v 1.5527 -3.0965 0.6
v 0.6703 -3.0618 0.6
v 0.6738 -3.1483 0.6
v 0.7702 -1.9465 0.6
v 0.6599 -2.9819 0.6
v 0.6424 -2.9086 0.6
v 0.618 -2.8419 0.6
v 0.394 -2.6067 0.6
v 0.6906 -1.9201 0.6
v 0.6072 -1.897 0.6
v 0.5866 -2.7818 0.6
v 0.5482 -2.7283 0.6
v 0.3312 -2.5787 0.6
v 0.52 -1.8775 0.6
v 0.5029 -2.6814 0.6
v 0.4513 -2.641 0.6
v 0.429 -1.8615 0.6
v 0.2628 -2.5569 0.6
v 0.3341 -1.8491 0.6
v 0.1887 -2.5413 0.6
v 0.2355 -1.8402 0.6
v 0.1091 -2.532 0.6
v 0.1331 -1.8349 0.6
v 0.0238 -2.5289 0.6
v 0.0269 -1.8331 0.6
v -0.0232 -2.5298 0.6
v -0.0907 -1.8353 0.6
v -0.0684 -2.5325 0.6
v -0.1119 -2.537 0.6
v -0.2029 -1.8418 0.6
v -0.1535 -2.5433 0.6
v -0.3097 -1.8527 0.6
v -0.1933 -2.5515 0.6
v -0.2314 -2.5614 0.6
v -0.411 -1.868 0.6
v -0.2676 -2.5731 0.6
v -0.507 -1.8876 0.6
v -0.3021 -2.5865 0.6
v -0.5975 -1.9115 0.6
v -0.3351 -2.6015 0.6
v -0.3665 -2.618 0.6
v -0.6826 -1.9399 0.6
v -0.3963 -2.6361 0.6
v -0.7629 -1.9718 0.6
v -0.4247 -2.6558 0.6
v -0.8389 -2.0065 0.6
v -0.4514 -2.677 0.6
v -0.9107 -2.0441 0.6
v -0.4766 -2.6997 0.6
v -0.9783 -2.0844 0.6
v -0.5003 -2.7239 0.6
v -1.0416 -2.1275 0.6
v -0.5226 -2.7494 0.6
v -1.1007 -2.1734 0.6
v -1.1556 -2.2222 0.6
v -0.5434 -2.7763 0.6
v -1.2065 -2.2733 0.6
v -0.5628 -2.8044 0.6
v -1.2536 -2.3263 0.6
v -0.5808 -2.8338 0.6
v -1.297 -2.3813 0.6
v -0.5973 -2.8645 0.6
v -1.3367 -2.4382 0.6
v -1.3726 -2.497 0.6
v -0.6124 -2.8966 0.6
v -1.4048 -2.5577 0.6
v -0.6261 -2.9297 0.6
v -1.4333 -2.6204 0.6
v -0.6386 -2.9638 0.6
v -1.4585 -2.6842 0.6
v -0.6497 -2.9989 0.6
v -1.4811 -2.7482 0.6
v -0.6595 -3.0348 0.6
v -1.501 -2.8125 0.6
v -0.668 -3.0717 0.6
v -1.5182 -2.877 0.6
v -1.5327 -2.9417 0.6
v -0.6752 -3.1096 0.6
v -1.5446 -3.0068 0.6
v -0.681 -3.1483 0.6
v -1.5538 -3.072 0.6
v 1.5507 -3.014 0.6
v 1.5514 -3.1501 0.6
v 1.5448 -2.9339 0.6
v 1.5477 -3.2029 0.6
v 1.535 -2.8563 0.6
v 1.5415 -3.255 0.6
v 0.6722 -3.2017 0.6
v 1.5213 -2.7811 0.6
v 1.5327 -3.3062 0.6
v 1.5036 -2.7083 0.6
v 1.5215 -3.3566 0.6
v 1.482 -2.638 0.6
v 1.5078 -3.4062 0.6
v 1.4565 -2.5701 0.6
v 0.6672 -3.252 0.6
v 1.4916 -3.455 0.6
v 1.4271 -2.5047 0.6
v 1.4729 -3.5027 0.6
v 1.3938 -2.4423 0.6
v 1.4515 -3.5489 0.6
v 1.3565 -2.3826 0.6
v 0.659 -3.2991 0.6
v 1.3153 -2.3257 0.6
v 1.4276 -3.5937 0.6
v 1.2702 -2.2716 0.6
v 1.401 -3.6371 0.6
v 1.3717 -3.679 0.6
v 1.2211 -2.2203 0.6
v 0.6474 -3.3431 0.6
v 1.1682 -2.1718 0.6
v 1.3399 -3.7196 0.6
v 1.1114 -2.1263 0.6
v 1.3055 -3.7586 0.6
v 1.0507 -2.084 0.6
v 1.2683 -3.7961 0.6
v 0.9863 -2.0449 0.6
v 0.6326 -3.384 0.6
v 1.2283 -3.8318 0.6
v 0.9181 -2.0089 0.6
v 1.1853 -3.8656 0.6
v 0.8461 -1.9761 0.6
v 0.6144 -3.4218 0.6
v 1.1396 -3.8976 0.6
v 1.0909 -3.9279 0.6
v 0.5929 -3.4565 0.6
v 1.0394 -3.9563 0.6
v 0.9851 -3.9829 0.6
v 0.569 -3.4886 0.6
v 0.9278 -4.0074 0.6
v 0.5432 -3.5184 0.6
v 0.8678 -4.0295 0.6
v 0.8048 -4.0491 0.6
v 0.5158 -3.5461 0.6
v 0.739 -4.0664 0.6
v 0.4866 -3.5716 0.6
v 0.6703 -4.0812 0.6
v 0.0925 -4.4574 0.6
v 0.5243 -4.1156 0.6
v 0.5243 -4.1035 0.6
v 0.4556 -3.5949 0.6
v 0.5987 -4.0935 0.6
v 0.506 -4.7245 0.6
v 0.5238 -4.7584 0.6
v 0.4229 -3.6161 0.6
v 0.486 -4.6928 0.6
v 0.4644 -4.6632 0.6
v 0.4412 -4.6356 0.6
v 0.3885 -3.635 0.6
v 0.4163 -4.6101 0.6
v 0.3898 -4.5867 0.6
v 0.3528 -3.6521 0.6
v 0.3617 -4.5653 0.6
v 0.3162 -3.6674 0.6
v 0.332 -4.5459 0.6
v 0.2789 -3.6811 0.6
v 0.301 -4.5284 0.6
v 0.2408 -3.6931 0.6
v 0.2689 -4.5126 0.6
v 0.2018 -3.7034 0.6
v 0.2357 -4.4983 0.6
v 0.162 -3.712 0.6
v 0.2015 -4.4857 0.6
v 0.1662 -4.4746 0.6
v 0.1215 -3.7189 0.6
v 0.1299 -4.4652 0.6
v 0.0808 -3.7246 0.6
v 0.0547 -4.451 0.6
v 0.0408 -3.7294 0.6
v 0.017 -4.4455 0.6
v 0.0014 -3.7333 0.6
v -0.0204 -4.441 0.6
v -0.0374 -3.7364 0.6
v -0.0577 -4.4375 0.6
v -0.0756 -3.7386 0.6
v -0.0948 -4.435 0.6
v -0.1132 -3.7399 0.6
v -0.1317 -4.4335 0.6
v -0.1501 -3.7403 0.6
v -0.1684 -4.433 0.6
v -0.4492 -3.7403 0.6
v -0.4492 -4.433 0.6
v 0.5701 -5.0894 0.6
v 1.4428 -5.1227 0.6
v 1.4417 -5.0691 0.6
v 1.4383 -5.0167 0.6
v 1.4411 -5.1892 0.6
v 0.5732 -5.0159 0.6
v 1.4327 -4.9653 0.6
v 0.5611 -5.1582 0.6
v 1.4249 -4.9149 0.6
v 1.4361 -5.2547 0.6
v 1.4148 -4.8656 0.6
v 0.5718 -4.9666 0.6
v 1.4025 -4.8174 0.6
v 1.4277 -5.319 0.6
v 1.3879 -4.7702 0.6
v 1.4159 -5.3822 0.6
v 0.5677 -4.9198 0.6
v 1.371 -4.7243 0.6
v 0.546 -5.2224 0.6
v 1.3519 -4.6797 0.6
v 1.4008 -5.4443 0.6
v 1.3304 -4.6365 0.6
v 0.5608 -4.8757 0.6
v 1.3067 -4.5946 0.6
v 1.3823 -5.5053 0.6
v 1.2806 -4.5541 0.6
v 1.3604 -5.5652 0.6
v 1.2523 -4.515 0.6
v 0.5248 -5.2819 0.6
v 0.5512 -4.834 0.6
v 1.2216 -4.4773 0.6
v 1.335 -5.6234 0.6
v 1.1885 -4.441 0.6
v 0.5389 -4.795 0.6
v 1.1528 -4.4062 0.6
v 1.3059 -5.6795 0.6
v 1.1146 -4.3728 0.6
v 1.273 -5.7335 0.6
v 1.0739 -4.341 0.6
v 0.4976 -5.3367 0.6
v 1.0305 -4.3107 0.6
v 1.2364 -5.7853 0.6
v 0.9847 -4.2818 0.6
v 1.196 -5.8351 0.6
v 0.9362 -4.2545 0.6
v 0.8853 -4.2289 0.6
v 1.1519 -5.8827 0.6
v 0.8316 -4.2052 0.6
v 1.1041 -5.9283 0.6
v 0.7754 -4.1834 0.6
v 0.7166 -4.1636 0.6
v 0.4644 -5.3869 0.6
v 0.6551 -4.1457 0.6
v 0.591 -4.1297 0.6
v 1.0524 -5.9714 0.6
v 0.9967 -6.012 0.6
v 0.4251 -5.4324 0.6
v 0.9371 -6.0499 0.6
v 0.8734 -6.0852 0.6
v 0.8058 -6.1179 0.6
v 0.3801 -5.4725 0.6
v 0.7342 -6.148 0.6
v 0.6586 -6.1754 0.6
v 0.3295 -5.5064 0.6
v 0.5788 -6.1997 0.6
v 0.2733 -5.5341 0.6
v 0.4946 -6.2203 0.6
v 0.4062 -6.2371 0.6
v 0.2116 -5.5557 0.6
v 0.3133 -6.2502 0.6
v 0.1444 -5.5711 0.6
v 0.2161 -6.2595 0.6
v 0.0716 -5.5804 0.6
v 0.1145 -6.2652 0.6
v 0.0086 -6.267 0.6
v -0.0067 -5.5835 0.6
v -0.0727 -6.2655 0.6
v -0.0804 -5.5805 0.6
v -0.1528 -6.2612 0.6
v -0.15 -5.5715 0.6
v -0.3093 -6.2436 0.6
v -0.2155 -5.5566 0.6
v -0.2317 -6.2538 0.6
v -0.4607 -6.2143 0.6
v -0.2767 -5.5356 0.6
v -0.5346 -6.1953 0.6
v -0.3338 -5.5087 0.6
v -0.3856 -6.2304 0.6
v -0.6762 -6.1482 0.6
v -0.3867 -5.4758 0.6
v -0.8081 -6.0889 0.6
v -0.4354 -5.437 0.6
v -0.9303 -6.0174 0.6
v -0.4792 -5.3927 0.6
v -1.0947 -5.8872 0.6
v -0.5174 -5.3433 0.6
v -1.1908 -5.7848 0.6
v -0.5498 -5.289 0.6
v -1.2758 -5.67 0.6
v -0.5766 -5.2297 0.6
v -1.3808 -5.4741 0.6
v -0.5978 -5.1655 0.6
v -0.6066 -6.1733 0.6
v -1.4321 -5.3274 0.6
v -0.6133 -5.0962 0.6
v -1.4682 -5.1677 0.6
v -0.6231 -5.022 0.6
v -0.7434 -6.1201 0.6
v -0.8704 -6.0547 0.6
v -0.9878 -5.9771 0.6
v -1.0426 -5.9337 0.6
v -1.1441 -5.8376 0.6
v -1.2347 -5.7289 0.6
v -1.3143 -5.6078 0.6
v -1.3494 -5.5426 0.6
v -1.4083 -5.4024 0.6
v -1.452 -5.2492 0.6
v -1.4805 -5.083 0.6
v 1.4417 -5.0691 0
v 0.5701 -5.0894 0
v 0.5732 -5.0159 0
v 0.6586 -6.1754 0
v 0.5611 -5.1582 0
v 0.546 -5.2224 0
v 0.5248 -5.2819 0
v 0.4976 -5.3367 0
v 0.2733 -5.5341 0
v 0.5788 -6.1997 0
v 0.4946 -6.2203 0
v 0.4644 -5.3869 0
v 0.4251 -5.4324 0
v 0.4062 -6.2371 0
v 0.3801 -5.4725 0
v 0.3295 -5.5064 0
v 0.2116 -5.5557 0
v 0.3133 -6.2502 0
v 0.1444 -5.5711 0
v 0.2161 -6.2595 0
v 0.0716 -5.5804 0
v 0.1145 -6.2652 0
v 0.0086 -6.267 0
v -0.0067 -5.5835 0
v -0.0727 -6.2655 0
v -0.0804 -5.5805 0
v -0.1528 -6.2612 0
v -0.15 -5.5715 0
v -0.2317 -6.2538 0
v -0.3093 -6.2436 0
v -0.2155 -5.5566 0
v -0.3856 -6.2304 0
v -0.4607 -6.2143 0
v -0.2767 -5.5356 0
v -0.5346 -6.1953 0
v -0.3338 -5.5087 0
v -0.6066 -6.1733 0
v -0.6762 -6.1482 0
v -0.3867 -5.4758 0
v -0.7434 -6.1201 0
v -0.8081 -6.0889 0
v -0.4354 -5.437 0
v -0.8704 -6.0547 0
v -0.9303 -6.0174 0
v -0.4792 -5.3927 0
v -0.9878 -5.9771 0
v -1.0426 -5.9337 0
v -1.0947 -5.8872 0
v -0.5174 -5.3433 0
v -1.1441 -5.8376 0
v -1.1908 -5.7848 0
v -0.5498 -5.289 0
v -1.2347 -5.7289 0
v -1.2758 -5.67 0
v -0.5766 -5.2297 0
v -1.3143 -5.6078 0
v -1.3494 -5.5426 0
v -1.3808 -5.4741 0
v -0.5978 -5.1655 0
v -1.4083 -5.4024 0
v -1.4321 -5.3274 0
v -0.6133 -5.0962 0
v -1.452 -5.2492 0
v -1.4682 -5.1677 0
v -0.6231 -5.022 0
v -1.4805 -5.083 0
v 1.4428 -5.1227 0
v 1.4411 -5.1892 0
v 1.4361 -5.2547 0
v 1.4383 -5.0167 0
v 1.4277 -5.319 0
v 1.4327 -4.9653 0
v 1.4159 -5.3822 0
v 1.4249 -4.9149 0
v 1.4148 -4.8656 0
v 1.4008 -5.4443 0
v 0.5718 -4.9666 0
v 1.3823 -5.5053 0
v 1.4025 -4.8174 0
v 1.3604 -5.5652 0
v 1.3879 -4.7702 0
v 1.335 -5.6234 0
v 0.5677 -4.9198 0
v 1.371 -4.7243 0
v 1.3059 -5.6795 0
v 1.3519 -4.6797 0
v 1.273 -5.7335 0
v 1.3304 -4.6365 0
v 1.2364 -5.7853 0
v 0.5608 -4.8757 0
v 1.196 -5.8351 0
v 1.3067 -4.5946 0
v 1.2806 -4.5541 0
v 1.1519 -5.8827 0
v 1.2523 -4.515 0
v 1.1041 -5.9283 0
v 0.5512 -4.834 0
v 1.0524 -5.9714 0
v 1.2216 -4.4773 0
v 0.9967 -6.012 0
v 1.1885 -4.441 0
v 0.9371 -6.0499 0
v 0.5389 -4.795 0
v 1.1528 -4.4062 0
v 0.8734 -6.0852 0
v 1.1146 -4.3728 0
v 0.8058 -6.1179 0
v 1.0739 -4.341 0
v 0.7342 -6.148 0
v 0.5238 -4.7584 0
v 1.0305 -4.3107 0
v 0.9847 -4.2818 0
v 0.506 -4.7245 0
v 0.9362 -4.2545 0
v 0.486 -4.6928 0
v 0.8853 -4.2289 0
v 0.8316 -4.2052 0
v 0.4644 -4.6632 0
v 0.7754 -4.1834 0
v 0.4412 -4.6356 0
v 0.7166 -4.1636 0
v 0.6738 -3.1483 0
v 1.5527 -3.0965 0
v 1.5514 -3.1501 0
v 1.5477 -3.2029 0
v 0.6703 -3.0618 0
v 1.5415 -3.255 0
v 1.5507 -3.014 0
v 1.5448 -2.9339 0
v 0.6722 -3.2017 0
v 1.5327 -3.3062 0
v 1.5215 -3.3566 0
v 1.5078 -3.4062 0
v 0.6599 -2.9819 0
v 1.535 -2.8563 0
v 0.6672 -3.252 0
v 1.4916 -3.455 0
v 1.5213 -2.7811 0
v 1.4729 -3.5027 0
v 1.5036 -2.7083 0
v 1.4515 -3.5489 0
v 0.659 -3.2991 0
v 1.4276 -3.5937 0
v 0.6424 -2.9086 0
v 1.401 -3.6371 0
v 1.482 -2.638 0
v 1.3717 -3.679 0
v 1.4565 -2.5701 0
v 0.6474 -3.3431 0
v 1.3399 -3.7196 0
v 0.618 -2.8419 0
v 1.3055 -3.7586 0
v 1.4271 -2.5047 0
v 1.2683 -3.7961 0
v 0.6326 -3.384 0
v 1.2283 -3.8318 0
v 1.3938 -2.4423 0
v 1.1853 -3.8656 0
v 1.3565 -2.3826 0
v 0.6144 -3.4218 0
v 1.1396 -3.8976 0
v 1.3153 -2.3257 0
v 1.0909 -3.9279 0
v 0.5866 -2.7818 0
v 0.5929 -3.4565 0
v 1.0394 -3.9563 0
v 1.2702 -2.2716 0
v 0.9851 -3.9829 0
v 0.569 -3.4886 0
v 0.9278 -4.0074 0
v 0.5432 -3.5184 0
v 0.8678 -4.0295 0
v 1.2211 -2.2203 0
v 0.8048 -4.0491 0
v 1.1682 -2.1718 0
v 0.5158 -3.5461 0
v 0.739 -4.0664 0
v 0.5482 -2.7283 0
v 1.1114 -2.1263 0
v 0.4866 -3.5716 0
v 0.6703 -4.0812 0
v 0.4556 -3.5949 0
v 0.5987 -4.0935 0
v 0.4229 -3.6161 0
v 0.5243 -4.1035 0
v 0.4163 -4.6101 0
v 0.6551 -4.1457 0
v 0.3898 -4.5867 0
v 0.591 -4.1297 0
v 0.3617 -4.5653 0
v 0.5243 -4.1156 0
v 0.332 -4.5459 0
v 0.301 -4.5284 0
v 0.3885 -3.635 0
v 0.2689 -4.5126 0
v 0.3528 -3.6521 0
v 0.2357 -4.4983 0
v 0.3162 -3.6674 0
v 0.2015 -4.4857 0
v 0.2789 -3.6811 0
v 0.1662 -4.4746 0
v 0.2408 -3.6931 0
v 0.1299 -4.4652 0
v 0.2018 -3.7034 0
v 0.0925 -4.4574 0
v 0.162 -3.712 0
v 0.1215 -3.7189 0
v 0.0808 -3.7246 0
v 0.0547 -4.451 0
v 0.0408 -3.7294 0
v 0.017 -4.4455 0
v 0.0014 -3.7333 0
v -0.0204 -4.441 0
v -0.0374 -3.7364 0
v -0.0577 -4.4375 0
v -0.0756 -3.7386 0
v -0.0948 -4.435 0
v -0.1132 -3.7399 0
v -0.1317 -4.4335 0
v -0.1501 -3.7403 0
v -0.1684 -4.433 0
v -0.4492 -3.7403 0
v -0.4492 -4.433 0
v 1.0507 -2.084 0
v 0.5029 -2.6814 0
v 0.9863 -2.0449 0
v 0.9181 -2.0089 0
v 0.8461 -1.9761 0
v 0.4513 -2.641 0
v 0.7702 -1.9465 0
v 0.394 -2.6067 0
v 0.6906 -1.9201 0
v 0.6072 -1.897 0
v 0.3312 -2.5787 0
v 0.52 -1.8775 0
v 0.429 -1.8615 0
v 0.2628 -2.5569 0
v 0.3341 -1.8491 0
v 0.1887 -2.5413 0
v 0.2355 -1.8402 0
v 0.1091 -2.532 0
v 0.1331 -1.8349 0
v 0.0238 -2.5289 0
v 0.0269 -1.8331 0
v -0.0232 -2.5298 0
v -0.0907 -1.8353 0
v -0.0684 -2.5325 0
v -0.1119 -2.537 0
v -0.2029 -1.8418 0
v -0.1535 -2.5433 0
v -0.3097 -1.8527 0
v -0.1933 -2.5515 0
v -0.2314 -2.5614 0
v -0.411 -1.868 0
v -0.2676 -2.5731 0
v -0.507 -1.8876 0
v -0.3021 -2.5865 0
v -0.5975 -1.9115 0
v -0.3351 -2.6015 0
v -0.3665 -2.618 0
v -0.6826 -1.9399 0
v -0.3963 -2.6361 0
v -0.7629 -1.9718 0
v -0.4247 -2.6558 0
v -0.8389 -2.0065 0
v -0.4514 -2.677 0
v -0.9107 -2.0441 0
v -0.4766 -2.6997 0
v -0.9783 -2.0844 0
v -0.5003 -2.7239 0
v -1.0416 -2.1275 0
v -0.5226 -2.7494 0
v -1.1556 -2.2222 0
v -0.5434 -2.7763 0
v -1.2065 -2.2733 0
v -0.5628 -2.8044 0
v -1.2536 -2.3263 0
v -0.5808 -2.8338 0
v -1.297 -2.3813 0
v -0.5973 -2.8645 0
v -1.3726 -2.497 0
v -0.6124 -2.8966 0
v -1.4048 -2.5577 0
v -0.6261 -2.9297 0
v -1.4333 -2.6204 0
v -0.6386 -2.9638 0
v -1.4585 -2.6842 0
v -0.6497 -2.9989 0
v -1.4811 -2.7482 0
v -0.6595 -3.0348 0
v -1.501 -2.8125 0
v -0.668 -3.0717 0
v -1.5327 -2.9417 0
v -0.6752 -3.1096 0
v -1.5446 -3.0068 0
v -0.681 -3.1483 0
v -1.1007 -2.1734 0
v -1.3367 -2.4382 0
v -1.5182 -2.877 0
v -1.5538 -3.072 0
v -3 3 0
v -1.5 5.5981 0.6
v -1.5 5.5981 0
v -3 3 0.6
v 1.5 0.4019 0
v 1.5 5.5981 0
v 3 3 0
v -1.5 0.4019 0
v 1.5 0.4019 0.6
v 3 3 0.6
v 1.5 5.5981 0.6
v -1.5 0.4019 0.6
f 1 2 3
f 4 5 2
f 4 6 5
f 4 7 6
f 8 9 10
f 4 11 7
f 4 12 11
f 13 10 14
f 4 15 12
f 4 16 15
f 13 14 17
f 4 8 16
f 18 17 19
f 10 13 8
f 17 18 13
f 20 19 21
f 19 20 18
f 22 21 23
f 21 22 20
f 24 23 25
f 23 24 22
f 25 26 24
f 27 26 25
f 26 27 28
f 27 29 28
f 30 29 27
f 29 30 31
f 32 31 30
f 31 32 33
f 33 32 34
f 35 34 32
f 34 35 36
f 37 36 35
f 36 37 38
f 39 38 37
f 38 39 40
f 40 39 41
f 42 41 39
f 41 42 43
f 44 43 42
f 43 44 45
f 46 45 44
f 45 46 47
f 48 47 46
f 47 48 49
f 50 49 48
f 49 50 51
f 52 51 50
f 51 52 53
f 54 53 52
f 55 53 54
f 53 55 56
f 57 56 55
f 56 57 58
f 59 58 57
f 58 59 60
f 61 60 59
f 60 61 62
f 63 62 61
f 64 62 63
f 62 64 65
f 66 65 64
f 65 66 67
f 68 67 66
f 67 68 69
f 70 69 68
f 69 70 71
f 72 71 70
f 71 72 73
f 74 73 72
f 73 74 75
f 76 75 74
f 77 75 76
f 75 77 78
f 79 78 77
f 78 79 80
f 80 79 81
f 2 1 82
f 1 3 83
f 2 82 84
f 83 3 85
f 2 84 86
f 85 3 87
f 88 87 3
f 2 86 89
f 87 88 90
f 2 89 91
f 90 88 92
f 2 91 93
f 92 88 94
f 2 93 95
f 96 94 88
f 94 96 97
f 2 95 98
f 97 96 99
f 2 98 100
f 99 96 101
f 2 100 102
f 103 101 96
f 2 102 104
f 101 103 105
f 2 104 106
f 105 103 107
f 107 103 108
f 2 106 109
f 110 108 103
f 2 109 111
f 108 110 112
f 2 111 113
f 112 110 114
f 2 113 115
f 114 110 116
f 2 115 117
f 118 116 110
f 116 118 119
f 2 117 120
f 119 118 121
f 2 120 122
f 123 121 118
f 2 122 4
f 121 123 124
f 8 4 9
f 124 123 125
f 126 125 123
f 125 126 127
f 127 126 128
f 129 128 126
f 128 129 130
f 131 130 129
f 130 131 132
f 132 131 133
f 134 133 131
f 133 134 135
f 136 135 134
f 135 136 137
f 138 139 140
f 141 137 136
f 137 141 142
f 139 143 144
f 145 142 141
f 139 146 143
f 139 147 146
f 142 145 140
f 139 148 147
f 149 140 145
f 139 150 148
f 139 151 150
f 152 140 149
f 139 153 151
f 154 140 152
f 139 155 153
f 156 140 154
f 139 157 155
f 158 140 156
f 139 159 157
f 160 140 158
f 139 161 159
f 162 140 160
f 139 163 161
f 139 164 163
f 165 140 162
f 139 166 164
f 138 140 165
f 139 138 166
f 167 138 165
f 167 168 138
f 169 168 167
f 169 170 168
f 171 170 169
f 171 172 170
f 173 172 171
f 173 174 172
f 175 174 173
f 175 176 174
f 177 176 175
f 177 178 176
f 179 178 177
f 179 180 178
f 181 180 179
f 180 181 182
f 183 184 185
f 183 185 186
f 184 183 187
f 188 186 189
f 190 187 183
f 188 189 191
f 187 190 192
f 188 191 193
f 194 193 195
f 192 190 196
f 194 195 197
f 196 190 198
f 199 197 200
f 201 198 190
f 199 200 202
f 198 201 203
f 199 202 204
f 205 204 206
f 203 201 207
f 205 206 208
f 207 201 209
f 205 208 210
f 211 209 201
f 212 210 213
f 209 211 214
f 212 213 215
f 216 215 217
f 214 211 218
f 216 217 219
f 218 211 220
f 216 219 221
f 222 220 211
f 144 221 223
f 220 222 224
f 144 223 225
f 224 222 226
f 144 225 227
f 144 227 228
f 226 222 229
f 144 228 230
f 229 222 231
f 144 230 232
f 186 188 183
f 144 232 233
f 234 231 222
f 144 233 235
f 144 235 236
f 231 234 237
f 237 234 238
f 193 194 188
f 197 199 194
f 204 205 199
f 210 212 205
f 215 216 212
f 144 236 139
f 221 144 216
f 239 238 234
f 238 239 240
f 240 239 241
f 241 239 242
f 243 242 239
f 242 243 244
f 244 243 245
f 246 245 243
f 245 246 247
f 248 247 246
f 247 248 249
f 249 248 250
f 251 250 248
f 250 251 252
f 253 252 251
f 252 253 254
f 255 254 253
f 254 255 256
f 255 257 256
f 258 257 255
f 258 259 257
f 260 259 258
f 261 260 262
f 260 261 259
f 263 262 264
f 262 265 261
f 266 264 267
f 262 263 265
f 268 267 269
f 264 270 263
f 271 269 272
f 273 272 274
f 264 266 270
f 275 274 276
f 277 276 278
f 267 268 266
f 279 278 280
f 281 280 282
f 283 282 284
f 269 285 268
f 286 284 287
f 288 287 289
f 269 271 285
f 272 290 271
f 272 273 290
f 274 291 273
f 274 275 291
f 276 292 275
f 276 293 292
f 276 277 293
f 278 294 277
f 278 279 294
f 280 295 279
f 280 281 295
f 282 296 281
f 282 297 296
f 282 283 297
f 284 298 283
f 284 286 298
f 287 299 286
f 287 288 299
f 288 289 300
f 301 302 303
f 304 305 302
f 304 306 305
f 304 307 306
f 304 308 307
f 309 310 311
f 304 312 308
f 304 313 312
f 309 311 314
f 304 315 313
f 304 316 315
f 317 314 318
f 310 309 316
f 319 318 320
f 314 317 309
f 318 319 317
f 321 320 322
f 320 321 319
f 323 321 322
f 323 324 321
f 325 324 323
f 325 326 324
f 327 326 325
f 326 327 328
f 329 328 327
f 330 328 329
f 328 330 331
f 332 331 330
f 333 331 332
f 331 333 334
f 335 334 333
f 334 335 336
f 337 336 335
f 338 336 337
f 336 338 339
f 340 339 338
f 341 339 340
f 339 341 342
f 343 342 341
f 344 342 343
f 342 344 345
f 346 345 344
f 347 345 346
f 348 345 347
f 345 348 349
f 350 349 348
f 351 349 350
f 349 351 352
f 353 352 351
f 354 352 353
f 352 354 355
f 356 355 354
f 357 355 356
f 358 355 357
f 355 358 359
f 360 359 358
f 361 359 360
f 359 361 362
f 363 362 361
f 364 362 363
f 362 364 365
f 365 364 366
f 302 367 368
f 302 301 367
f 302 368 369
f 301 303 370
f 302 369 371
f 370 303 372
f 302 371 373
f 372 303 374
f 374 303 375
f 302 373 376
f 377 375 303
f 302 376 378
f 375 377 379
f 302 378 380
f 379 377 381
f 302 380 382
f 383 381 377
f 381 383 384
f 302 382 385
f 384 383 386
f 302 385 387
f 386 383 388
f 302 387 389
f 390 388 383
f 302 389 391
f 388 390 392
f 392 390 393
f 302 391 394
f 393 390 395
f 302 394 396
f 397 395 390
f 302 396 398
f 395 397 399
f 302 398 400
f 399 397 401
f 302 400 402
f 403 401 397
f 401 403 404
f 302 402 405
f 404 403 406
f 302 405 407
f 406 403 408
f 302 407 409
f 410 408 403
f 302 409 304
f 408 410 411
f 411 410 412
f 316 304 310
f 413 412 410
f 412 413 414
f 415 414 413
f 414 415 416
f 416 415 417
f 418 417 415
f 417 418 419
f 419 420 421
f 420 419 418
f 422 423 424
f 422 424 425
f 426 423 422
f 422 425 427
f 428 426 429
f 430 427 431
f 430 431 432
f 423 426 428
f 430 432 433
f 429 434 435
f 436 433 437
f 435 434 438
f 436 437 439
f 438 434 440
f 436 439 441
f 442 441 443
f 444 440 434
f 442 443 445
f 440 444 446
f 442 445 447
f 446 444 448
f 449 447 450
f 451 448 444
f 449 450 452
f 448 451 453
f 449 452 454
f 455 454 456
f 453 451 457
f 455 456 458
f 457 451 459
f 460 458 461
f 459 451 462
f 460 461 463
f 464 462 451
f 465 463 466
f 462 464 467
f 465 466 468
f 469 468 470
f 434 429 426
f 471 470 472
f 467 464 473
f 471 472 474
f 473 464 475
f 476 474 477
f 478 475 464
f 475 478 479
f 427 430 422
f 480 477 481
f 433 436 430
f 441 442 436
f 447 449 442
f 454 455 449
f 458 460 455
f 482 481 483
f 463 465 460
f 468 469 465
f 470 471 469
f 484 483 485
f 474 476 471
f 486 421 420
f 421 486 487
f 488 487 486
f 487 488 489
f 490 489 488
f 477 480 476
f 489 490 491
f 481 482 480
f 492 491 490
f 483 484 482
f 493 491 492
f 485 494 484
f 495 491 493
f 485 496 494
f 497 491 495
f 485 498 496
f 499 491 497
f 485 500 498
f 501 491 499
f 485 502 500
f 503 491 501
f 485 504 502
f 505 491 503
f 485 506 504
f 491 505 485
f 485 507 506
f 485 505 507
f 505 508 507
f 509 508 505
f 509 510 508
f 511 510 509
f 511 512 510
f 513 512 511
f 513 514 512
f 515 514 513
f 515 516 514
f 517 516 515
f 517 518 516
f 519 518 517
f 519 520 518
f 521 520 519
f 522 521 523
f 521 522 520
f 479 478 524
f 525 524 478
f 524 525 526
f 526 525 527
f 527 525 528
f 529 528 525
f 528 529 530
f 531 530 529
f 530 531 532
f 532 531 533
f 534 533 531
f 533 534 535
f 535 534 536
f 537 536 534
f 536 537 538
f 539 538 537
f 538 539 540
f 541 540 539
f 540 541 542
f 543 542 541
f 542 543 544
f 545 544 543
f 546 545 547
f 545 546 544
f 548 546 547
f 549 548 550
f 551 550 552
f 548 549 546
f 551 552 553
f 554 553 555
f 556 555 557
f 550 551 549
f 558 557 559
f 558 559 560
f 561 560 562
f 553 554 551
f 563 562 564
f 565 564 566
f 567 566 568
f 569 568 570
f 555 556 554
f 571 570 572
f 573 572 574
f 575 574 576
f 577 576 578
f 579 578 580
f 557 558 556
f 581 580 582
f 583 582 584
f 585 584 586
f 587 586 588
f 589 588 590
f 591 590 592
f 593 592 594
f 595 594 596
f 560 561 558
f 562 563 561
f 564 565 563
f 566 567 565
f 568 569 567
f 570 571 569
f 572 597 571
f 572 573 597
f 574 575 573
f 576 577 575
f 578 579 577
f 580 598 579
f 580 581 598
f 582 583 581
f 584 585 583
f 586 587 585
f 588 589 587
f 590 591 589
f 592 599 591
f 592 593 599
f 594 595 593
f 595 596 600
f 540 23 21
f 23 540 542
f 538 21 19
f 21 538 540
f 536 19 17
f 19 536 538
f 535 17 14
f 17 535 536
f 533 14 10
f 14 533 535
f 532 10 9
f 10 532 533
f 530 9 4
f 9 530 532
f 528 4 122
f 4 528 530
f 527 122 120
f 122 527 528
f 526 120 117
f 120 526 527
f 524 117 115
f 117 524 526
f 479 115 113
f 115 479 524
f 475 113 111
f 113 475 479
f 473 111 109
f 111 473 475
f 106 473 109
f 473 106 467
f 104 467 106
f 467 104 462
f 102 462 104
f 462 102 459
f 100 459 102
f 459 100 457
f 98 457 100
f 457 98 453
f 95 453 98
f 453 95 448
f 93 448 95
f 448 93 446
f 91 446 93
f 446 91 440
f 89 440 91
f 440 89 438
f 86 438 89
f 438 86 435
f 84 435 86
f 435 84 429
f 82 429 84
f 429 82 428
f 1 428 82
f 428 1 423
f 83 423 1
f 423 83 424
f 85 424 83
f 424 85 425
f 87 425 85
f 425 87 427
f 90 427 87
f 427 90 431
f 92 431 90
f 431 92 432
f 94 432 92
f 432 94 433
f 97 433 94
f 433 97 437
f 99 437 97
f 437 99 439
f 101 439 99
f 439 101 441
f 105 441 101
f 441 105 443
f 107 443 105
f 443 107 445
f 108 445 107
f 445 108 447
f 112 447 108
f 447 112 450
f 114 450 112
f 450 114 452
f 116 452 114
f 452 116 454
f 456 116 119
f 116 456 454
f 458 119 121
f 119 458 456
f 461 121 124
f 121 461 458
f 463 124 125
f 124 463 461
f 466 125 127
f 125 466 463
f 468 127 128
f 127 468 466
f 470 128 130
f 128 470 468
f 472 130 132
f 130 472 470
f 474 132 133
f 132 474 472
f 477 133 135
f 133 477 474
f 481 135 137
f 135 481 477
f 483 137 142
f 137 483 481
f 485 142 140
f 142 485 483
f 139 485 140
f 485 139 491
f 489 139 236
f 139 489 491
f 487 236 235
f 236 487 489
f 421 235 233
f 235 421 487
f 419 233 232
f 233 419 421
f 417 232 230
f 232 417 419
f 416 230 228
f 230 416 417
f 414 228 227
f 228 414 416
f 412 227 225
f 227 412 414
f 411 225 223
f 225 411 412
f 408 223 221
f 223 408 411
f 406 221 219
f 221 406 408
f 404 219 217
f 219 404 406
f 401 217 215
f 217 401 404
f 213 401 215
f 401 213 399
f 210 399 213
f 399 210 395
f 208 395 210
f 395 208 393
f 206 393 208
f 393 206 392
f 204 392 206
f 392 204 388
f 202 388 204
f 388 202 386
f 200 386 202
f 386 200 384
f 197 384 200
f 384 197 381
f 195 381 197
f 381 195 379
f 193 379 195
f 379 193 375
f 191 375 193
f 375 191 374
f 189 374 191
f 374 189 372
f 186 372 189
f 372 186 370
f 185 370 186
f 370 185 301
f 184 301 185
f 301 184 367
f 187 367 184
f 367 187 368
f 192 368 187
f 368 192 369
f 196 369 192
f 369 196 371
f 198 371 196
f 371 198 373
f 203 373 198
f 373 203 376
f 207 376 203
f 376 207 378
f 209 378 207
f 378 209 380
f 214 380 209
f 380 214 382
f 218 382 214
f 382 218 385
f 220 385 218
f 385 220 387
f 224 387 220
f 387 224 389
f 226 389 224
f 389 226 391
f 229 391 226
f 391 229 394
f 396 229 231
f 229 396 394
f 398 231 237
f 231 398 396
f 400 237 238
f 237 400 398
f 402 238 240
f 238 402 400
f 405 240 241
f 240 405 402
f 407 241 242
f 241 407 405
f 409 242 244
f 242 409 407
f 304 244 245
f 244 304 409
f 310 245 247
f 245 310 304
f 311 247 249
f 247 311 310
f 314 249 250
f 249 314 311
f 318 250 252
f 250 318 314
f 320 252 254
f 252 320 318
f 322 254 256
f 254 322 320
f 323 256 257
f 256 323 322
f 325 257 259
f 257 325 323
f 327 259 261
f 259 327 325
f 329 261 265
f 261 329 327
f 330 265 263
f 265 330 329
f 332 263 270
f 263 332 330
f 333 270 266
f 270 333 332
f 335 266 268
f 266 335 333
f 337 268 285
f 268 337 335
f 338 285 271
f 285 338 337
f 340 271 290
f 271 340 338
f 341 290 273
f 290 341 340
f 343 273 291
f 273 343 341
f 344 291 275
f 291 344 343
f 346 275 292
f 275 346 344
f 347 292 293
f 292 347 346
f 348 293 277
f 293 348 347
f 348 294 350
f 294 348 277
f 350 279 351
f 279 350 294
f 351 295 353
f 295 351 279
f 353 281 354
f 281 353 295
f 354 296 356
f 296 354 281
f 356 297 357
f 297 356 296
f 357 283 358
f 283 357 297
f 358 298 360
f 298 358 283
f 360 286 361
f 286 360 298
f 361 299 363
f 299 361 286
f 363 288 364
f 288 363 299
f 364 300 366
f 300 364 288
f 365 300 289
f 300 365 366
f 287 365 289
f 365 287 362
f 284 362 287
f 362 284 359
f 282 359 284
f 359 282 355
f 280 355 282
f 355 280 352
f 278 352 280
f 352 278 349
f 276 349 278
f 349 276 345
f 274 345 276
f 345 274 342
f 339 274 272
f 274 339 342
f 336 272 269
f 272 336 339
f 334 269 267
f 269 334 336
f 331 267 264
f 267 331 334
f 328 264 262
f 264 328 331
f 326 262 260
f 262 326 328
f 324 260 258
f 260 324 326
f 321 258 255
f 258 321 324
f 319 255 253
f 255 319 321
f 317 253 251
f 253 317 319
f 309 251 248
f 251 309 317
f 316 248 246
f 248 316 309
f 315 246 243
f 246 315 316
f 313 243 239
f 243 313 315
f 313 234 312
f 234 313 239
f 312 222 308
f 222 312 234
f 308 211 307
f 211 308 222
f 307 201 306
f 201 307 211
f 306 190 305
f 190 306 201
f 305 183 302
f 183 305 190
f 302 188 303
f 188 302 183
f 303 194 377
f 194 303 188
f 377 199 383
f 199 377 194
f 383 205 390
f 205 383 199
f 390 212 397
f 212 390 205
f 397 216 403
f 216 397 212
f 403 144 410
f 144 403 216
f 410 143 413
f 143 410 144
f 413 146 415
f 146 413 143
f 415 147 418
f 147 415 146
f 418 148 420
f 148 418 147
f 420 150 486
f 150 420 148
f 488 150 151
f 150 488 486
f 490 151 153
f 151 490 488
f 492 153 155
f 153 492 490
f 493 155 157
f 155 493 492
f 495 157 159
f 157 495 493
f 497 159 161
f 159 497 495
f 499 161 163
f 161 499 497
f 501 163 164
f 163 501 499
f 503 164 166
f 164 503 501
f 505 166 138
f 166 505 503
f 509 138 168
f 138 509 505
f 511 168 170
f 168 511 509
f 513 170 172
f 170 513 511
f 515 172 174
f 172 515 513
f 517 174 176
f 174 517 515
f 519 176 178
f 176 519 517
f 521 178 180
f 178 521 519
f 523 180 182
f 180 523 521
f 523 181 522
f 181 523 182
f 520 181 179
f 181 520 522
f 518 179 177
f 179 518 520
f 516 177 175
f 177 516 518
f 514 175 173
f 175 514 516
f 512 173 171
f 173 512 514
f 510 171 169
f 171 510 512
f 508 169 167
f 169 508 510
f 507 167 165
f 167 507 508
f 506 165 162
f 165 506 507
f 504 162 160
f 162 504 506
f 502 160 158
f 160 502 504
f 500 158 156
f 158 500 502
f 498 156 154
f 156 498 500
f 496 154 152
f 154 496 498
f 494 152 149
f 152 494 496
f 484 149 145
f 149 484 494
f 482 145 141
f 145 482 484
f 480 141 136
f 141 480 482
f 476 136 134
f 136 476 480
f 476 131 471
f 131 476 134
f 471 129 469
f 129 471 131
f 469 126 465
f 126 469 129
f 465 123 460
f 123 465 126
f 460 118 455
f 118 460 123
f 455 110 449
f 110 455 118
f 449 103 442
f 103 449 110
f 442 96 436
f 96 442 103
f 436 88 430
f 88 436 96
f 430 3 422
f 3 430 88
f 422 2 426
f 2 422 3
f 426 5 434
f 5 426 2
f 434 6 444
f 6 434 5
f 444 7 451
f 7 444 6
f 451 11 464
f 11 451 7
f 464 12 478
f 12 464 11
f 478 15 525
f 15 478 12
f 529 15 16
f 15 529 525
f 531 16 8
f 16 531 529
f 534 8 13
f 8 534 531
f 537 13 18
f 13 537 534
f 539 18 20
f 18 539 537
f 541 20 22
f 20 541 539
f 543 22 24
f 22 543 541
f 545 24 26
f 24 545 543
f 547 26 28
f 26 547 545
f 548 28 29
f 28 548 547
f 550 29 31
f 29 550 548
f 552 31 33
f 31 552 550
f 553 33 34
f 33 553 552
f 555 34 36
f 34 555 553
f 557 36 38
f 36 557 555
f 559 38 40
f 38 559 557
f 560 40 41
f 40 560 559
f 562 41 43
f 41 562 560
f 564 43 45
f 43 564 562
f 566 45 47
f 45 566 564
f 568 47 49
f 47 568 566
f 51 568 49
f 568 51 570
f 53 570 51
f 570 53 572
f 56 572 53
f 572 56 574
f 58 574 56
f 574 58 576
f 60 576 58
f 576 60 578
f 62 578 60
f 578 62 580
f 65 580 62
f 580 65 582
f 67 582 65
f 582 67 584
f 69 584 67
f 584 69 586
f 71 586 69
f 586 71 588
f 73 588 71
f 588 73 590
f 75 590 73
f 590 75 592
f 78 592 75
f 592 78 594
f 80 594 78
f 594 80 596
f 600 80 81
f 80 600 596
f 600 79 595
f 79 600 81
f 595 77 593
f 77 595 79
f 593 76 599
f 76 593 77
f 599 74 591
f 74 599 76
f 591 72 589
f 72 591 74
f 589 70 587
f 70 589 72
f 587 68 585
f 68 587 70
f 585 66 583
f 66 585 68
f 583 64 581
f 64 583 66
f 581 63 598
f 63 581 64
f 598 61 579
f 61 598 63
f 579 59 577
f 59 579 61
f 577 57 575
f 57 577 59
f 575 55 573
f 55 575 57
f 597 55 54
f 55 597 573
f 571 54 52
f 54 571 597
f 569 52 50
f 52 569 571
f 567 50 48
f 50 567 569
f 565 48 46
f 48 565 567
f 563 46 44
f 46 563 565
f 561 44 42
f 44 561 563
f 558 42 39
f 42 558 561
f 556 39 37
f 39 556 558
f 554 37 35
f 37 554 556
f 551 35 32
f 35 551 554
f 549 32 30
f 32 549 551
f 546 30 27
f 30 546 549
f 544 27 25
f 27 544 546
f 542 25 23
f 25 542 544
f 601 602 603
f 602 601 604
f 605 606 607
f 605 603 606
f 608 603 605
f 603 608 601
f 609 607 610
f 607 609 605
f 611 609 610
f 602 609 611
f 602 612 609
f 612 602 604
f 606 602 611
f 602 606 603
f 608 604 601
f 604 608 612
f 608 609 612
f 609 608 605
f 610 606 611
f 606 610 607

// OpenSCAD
$fn = 50;

difference() {
	union() {
		translate(v = [0.0, -4.0, 0.6]) {
			rotate(a = [180, 0, 0]) {
				linear_extrude(height = 0.6) {
					text(font = "Liberation Sans:style=Bold", halign = "center", size = 4.5, text = "3", valign = "center");
				}
			}
		}
		translate(v = [0, 3, 0]) {
			linear_extrude(height = 0.6) {
				polygon(points = [[3.0, 0.0], [1.5000000000000004, 2.598076211353316], [-1.4999999999999993, 2.598076211353316], [-3.0, 3.6739403974420594e-16], [-1.5000000000000013, -2.5980762113533156], [1.499999999999998, -2.598076211353317]]);
			}
		}
	}
	union();
}
